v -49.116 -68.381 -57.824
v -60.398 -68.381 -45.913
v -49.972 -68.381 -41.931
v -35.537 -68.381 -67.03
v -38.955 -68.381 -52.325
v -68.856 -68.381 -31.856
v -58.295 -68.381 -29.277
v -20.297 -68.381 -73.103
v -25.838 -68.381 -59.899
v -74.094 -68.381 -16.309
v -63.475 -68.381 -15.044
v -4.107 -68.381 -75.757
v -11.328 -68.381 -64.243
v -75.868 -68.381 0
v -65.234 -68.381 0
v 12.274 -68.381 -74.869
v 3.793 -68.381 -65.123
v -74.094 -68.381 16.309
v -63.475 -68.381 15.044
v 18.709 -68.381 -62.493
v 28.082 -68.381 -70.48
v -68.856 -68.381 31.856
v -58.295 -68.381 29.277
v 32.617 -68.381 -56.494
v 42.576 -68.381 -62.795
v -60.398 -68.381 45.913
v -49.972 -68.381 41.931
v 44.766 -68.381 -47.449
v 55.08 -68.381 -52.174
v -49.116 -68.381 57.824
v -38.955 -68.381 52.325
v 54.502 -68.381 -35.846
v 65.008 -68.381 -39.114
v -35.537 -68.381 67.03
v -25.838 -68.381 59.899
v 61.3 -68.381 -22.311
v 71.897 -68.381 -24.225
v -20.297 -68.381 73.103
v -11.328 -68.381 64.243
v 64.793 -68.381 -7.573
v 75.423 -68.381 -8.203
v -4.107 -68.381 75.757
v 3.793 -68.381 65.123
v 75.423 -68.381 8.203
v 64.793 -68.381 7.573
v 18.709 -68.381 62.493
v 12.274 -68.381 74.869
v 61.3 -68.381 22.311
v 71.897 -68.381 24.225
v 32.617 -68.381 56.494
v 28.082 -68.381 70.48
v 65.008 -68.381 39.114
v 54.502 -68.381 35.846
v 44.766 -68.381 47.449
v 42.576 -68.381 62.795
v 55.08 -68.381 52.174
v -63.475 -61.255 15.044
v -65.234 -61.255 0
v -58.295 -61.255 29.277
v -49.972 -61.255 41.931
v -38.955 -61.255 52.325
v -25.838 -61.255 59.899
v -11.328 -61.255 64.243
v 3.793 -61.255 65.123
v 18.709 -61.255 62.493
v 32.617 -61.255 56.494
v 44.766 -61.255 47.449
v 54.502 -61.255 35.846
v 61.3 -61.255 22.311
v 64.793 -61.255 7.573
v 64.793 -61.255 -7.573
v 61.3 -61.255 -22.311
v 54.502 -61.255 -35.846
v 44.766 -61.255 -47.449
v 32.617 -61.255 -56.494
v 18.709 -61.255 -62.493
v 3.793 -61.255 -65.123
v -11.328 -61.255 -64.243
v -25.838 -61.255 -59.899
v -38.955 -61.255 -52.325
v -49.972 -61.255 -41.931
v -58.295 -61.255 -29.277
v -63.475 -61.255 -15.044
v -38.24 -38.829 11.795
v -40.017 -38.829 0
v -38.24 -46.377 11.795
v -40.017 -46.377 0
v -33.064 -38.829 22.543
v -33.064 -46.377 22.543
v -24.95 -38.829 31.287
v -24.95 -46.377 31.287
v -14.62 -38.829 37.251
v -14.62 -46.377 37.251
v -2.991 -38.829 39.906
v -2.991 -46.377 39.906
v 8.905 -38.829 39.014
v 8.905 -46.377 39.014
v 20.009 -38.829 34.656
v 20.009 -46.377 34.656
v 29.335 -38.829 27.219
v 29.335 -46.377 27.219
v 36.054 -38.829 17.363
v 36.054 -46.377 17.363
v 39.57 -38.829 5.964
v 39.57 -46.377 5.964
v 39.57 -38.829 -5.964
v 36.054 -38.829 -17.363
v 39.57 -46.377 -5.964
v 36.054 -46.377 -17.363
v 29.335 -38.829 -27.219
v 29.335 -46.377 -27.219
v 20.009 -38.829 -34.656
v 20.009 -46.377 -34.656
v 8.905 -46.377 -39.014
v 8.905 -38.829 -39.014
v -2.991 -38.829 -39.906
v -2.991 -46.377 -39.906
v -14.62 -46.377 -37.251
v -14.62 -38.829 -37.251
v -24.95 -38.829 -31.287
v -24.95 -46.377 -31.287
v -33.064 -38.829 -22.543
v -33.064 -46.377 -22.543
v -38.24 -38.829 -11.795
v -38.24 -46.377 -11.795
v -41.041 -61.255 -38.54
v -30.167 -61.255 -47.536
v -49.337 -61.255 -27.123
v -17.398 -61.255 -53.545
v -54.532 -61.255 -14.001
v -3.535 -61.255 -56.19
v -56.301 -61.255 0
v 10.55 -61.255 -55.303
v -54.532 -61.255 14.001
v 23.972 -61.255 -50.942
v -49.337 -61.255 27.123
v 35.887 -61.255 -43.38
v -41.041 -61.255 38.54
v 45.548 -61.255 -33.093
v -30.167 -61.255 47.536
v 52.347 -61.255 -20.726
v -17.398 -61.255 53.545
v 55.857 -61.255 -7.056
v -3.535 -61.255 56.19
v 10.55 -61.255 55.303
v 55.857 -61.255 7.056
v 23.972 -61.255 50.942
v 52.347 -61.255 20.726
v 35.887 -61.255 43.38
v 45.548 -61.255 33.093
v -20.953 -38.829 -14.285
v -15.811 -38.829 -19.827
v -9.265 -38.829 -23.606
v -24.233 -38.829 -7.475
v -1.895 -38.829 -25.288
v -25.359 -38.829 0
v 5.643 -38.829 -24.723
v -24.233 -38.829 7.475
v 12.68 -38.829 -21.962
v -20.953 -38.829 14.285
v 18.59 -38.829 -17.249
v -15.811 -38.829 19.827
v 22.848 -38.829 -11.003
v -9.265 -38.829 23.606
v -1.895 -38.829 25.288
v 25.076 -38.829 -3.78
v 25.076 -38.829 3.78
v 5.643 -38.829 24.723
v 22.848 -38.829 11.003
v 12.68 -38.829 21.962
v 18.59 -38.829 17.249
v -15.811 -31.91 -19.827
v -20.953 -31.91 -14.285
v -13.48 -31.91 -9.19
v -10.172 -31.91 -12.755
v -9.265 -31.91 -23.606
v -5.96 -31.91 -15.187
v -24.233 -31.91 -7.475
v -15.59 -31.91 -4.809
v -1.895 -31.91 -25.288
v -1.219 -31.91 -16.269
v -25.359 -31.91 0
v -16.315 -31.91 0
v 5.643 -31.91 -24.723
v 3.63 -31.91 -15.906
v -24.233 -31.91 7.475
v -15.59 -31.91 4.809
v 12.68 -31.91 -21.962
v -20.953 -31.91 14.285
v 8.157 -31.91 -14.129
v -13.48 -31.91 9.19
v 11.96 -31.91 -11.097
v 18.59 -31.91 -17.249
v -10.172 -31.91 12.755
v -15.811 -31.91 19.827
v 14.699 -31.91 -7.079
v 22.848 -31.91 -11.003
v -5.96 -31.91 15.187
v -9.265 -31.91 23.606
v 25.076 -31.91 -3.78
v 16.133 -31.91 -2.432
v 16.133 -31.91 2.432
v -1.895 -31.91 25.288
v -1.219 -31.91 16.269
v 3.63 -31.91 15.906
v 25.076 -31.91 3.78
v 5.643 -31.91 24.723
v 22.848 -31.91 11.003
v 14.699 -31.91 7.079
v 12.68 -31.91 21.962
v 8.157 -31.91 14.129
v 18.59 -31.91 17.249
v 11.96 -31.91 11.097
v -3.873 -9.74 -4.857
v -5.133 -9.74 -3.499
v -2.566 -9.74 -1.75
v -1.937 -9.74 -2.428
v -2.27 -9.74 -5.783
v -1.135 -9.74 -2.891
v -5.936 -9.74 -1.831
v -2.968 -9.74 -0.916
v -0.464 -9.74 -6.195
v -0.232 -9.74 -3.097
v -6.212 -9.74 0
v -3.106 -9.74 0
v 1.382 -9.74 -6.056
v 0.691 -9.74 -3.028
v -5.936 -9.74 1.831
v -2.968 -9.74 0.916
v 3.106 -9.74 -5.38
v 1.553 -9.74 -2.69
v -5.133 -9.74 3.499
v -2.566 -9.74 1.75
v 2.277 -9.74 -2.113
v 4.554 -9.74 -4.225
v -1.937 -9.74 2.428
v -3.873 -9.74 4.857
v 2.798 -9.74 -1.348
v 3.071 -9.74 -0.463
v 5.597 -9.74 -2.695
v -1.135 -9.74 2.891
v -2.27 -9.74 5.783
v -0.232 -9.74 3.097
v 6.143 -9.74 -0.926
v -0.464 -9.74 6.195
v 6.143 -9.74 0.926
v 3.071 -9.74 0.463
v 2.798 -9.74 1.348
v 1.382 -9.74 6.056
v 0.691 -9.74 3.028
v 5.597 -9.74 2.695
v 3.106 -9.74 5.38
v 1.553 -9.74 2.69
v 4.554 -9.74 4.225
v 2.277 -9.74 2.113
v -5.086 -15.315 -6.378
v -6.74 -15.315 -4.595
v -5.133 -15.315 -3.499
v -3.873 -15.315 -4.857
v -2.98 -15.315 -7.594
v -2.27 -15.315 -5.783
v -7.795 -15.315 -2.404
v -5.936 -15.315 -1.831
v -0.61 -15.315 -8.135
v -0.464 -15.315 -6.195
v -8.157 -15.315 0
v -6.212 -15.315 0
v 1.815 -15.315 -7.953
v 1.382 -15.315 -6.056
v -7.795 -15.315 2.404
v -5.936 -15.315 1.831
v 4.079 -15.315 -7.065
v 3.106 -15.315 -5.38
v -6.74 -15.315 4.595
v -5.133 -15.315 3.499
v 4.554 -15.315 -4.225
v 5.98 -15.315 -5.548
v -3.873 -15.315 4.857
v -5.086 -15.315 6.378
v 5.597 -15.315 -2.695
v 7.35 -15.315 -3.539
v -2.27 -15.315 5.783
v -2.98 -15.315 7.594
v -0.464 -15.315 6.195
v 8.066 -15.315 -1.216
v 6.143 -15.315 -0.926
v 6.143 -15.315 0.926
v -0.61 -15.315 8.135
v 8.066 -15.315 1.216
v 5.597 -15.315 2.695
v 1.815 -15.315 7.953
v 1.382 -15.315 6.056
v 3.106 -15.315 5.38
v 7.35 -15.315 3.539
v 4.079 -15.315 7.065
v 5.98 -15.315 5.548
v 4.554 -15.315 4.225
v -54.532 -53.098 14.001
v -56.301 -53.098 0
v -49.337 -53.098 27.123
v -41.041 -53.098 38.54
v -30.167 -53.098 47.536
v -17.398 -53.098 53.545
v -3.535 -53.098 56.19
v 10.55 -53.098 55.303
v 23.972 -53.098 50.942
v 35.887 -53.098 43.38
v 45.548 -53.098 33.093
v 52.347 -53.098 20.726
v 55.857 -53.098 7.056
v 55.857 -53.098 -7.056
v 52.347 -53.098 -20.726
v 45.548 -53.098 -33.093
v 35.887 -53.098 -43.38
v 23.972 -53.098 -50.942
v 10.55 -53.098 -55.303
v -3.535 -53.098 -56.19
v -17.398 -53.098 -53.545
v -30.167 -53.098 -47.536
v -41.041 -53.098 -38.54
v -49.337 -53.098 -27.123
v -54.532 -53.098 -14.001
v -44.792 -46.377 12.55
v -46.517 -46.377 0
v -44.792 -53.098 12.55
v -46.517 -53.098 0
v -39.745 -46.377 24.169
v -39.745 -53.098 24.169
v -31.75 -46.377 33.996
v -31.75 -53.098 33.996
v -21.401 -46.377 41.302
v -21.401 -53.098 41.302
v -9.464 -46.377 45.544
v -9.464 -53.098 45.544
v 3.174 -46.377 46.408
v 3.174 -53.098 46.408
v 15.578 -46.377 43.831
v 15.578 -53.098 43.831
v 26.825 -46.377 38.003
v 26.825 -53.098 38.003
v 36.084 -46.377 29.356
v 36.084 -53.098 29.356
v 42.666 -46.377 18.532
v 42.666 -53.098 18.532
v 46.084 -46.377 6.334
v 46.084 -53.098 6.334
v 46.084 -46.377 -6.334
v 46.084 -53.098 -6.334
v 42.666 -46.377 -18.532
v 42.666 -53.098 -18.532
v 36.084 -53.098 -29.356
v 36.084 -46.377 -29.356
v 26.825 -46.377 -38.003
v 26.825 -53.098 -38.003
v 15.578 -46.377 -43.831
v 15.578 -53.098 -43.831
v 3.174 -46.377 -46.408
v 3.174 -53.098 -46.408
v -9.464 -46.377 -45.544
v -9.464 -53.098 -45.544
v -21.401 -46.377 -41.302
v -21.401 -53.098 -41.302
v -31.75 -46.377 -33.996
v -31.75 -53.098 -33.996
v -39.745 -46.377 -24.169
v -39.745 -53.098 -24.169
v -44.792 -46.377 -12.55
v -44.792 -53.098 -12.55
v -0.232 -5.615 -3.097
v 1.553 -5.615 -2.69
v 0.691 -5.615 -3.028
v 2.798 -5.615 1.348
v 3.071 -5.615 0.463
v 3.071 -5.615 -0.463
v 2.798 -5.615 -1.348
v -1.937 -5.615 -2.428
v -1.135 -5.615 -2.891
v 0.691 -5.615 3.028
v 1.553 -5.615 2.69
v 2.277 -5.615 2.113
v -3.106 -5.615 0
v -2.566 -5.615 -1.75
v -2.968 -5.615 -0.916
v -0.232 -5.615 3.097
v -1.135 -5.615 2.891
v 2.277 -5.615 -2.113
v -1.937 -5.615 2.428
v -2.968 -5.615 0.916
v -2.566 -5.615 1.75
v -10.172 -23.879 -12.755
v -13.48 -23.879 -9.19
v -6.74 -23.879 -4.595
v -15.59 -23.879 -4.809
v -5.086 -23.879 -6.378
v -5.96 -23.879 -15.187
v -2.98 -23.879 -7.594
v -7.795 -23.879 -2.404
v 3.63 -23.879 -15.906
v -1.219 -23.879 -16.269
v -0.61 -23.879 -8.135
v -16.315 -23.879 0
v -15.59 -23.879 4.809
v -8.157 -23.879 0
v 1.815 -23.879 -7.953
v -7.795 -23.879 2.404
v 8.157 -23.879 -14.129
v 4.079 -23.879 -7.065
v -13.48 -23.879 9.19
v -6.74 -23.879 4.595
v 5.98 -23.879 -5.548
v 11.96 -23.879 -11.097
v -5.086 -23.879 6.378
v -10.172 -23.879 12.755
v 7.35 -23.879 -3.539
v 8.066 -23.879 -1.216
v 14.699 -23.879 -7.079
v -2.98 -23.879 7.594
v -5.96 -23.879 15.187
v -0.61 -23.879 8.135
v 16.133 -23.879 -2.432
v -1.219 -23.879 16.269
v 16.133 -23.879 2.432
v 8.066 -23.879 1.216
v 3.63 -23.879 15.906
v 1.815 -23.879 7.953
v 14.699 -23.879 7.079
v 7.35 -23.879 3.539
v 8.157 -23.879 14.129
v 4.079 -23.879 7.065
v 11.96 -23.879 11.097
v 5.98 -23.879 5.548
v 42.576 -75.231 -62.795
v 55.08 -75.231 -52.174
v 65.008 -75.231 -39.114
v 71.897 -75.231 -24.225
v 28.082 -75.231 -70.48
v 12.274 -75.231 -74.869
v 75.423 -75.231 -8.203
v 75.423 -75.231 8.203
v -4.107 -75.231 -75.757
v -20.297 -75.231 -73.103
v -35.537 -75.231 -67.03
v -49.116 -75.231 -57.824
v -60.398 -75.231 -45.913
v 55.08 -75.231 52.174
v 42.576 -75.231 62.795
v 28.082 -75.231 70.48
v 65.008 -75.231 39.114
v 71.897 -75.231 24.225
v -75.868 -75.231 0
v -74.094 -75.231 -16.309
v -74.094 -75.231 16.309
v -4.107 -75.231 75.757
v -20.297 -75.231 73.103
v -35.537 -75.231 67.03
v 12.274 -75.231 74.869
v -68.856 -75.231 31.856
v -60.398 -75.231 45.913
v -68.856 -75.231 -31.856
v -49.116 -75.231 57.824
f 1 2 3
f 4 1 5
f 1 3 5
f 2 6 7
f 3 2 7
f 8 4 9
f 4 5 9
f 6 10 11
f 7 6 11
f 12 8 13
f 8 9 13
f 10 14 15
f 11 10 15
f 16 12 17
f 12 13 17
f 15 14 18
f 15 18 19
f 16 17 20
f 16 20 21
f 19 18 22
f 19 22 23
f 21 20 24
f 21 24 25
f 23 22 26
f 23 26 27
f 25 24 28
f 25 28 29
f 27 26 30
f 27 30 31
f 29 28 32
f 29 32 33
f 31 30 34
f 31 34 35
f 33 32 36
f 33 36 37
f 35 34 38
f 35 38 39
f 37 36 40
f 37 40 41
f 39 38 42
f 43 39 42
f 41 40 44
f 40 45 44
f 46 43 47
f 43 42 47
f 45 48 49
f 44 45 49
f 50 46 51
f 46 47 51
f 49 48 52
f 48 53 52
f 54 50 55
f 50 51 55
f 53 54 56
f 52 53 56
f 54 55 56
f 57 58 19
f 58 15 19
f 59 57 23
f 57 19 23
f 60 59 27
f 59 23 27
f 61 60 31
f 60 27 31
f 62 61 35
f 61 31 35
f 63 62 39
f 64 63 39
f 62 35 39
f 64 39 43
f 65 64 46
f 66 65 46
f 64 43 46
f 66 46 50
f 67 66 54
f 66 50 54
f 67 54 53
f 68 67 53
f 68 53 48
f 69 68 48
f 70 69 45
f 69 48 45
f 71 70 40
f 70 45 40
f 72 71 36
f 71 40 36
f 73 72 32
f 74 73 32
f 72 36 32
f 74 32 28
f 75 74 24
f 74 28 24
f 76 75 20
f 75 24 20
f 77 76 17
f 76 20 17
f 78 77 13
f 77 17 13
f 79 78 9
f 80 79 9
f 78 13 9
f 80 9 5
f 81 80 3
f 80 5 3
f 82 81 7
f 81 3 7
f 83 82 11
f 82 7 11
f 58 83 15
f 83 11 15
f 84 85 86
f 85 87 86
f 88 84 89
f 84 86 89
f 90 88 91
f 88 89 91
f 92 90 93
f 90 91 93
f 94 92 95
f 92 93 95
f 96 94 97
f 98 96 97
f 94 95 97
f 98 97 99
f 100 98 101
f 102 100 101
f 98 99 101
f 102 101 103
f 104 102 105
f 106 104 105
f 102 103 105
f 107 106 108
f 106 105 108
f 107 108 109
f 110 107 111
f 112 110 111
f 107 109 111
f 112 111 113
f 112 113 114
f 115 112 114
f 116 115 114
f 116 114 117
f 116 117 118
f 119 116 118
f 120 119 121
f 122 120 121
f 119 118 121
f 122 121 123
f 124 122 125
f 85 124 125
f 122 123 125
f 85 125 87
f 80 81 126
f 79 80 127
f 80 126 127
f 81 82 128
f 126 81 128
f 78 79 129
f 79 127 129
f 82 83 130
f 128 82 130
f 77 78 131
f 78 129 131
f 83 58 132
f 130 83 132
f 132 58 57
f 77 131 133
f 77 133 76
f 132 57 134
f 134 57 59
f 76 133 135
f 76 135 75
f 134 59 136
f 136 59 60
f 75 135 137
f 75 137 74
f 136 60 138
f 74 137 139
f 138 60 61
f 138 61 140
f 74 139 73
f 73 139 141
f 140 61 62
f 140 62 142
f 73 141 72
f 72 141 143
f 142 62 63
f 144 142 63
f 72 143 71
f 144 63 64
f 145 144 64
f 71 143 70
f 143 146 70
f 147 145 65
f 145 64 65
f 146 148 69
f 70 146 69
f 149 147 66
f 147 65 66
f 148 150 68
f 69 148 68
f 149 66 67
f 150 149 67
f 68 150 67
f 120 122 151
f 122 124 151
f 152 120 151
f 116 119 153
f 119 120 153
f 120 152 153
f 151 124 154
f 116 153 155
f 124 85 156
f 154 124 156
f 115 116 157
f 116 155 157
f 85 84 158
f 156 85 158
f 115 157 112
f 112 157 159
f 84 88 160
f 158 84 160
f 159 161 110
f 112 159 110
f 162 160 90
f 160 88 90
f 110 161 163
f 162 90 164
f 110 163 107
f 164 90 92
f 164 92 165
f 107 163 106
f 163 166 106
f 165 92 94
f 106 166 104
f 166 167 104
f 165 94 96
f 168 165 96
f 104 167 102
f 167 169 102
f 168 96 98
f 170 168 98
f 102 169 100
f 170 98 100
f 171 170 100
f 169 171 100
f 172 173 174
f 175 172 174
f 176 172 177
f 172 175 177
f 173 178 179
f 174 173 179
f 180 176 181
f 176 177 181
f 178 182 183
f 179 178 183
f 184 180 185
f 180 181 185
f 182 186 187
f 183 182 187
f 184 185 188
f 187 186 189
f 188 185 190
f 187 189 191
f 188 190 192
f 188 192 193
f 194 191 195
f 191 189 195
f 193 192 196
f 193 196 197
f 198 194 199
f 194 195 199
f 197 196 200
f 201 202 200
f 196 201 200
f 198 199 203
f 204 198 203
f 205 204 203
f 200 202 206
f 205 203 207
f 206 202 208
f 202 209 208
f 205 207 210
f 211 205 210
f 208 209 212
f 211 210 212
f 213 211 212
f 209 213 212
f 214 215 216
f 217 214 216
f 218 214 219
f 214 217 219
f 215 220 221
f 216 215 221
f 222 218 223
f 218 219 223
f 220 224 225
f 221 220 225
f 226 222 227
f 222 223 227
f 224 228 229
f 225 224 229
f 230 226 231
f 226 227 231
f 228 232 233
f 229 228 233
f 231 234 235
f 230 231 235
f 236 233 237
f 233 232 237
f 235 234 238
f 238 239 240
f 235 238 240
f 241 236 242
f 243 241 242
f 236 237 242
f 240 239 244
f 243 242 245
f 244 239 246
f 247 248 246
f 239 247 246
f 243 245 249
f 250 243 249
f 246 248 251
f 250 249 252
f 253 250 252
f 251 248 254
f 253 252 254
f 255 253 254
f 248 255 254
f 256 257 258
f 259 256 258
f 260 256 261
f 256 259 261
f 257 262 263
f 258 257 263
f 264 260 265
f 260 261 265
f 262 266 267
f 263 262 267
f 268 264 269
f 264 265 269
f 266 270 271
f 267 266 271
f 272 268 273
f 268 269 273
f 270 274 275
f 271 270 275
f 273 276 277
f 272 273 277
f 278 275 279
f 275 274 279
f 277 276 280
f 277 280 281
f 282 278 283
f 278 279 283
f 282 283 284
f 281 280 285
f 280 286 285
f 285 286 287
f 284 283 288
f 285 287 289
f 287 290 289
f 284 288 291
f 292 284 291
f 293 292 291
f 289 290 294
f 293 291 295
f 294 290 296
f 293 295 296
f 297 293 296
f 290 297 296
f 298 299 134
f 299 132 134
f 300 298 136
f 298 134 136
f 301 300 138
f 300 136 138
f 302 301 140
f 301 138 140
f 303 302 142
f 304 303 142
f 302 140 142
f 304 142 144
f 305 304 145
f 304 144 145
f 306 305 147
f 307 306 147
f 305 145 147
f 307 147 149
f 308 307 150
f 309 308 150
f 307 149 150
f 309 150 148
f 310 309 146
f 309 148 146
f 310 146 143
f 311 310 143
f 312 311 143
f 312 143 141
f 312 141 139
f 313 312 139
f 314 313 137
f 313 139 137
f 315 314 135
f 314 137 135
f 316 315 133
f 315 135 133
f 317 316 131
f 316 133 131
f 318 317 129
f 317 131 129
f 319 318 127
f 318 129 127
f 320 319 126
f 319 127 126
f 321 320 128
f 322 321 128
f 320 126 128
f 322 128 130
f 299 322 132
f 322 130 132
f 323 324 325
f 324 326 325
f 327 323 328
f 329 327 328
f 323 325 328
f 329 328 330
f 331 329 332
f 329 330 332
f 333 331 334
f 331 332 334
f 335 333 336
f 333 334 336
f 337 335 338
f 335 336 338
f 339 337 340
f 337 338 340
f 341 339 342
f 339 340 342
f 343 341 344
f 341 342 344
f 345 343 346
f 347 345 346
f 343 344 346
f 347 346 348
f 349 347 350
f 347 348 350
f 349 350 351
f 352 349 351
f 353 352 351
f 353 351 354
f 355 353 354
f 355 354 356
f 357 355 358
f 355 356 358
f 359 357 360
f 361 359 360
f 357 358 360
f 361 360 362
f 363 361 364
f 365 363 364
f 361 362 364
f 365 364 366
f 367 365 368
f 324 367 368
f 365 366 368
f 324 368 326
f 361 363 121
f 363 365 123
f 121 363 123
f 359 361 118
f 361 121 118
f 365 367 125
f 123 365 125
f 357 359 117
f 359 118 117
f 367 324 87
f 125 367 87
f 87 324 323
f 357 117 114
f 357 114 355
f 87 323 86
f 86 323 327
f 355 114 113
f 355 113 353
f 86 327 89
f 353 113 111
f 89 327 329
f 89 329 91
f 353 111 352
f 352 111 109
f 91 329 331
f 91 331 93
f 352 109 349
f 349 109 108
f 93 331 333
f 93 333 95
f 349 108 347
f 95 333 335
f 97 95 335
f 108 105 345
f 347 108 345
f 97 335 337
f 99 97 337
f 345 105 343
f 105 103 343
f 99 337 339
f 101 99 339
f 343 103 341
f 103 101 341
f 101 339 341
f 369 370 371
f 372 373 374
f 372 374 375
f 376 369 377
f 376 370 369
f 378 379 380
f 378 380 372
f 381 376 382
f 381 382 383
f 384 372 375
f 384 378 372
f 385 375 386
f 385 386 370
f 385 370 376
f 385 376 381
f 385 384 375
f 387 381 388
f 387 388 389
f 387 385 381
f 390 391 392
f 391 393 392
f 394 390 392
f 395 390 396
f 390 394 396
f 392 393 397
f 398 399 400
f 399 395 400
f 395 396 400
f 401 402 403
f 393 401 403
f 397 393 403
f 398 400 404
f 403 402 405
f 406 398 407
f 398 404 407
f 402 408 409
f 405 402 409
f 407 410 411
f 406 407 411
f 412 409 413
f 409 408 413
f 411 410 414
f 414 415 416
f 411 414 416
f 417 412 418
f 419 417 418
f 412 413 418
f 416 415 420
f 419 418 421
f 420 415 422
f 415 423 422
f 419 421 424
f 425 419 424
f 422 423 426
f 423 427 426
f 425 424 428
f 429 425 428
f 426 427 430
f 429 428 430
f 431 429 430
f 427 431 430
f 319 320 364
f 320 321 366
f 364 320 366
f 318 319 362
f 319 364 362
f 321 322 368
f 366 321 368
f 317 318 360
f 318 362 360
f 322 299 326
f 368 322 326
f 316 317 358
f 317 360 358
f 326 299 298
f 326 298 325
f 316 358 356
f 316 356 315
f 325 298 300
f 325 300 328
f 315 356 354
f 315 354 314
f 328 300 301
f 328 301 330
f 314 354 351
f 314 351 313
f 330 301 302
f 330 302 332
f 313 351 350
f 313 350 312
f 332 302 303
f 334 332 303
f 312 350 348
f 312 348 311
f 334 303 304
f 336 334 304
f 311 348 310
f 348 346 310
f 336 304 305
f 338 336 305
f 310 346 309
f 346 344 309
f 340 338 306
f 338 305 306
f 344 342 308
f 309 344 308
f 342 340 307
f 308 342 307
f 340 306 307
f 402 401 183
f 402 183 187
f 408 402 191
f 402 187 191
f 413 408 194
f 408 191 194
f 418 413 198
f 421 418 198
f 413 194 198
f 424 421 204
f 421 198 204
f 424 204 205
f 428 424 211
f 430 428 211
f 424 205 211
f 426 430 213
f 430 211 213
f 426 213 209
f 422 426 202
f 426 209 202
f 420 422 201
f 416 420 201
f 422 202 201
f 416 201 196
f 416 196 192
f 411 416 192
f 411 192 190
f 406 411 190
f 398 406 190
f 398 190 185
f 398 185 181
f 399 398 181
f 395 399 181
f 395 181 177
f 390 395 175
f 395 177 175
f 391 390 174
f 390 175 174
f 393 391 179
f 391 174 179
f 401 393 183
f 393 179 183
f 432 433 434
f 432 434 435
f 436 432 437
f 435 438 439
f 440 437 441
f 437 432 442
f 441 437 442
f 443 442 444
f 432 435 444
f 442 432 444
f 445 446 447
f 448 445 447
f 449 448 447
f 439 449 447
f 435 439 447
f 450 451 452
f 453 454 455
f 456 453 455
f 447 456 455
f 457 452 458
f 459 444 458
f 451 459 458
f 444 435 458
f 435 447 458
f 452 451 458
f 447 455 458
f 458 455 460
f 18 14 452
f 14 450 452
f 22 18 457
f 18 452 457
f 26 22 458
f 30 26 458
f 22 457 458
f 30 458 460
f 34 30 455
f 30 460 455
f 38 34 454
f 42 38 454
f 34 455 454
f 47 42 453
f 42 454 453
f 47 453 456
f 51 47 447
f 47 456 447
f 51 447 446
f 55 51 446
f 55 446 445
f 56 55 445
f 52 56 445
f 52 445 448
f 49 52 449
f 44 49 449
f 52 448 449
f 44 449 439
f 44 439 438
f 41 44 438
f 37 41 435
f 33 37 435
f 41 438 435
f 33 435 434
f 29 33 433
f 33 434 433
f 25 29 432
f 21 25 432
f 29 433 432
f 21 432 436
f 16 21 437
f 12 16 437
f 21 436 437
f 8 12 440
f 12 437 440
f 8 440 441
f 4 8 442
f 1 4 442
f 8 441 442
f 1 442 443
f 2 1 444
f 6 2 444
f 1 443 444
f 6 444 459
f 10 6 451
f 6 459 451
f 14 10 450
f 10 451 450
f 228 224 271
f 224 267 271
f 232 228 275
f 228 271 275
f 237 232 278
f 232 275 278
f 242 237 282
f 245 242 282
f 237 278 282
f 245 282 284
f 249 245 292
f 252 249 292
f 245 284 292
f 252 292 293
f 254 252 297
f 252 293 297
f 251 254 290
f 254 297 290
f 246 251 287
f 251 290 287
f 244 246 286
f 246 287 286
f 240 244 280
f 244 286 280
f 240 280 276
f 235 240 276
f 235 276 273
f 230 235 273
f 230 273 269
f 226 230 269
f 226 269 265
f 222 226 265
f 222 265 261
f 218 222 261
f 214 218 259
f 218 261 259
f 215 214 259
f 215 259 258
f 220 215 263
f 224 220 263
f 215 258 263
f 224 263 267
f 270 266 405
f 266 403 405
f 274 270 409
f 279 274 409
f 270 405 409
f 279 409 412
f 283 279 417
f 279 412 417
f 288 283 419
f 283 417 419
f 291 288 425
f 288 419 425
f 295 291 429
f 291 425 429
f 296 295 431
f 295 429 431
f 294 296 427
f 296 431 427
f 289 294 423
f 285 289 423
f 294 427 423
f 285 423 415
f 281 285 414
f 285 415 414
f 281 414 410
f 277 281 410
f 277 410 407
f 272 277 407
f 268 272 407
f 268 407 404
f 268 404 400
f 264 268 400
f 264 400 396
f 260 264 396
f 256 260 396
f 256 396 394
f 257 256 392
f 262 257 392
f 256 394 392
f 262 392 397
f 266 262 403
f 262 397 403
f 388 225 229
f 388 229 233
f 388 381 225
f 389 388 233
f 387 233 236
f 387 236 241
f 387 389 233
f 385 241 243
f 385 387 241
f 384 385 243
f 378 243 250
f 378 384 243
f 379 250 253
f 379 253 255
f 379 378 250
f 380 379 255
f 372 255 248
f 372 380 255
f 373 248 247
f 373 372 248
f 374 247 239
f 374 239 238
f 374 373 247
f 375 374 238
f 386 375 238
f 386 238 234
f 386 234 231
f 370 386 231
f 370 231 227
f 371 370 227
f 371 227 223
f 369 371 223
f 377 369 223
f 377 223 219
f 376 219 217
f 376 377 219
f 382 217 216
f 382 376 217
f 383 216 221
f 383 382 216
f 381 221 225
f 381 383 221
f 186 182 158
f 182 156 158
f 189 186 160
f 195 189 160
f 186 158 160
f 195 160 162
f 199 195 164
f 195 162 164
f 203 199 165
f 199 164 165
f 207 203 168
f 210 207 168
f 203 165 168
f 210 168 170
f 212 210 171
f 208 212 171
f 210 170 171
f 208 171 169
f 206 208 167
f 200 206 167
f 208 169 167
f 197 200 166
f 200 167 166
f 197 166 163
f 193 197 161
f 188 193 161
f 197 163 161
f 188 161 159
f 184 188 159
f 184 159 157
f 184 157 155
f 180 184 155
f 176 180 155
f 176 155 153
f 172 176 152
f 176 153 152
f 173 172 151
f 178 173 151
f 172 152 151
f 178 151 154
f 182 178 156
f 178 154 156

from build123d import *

# Parameters (mm, degrees)
F0_W = 3.1060343608
F0_H = 4.1245449741


with BuildPart() as f1:
    # F0 (on Top) → F1 (revolve)
    with BuildSketch(Plane.XY):
        Polygon((-75.8681371808, -68.3808345637), (-75.8681371808, -75.2311423421), (0, -75.2311423421), (0, -68.3808345637), (-65.233618021, -68.3808345637), align=None)
        Polygon((-65.233618021, -68.3808345637), (0, -68.3808345637), (0, -61.2551711489), (-56.3006289303, -61.2551711489), (-65.233618021, -61.2551711489), align=None)
        Polygon((-56.3006289303, -61.2551711489), (0, -61.2551711489), (0, -53.0980758273), (-46.5168766677, -53.0980758273), (-56.3006289303, -53.0980758273), align=None)
        Polygon((-46.5168766677, -53.0980758273), (0, -53.0980758273), (0, -46.3767246723), (-40.0174387131, -46.3767246723), (-46.5168766677, -46.3767246723), align=None)
        Polygon((-40.0174387131, -46.3767246723), (0, -46.3767246723), (0, -38.8292317048), (-25.3592459775, -38.8292317048), (-40.0174387131, -38.8292317048), align=None)
        Polygon((-25.3592459775, -38.8292317048), (0, -38.8292317048), (0, -31.9099235999), (-16.3148548454, -31.9099235999), (-25.3592459775, -31.9099235999), align=None)
        Polygon((-16.3148548454, -31.9099235999), (0, -31.9099235999), (0, -23.8791607417), (-8.1574274227, -23.8791607417), (-16.3148548454, -23.8791607417), align=None)
        Polygon((-8.1574274227, -23.8791607417), (0, -23.8791607417), (0, -15.3151774863), (-6.2120687217, -15.3151774863), (-8.1574274227, -15.3151774863), align=None)
        with Locations((-1.5530171804, -7.6774568423)):
            Rectangle(F0_W, F0_H)
        Polygon((-6.2120687217, -15.3151774863), (0, -15.3151774863), (0, -9.7397293293), (-3.1060343608, -9.7397293293), (-6.2120687217, -9.7397293293), align=None)
    revolve(axis=Axis((0, -71.8059884529, 0), (0, 1, 0)))


solid = f1.part
